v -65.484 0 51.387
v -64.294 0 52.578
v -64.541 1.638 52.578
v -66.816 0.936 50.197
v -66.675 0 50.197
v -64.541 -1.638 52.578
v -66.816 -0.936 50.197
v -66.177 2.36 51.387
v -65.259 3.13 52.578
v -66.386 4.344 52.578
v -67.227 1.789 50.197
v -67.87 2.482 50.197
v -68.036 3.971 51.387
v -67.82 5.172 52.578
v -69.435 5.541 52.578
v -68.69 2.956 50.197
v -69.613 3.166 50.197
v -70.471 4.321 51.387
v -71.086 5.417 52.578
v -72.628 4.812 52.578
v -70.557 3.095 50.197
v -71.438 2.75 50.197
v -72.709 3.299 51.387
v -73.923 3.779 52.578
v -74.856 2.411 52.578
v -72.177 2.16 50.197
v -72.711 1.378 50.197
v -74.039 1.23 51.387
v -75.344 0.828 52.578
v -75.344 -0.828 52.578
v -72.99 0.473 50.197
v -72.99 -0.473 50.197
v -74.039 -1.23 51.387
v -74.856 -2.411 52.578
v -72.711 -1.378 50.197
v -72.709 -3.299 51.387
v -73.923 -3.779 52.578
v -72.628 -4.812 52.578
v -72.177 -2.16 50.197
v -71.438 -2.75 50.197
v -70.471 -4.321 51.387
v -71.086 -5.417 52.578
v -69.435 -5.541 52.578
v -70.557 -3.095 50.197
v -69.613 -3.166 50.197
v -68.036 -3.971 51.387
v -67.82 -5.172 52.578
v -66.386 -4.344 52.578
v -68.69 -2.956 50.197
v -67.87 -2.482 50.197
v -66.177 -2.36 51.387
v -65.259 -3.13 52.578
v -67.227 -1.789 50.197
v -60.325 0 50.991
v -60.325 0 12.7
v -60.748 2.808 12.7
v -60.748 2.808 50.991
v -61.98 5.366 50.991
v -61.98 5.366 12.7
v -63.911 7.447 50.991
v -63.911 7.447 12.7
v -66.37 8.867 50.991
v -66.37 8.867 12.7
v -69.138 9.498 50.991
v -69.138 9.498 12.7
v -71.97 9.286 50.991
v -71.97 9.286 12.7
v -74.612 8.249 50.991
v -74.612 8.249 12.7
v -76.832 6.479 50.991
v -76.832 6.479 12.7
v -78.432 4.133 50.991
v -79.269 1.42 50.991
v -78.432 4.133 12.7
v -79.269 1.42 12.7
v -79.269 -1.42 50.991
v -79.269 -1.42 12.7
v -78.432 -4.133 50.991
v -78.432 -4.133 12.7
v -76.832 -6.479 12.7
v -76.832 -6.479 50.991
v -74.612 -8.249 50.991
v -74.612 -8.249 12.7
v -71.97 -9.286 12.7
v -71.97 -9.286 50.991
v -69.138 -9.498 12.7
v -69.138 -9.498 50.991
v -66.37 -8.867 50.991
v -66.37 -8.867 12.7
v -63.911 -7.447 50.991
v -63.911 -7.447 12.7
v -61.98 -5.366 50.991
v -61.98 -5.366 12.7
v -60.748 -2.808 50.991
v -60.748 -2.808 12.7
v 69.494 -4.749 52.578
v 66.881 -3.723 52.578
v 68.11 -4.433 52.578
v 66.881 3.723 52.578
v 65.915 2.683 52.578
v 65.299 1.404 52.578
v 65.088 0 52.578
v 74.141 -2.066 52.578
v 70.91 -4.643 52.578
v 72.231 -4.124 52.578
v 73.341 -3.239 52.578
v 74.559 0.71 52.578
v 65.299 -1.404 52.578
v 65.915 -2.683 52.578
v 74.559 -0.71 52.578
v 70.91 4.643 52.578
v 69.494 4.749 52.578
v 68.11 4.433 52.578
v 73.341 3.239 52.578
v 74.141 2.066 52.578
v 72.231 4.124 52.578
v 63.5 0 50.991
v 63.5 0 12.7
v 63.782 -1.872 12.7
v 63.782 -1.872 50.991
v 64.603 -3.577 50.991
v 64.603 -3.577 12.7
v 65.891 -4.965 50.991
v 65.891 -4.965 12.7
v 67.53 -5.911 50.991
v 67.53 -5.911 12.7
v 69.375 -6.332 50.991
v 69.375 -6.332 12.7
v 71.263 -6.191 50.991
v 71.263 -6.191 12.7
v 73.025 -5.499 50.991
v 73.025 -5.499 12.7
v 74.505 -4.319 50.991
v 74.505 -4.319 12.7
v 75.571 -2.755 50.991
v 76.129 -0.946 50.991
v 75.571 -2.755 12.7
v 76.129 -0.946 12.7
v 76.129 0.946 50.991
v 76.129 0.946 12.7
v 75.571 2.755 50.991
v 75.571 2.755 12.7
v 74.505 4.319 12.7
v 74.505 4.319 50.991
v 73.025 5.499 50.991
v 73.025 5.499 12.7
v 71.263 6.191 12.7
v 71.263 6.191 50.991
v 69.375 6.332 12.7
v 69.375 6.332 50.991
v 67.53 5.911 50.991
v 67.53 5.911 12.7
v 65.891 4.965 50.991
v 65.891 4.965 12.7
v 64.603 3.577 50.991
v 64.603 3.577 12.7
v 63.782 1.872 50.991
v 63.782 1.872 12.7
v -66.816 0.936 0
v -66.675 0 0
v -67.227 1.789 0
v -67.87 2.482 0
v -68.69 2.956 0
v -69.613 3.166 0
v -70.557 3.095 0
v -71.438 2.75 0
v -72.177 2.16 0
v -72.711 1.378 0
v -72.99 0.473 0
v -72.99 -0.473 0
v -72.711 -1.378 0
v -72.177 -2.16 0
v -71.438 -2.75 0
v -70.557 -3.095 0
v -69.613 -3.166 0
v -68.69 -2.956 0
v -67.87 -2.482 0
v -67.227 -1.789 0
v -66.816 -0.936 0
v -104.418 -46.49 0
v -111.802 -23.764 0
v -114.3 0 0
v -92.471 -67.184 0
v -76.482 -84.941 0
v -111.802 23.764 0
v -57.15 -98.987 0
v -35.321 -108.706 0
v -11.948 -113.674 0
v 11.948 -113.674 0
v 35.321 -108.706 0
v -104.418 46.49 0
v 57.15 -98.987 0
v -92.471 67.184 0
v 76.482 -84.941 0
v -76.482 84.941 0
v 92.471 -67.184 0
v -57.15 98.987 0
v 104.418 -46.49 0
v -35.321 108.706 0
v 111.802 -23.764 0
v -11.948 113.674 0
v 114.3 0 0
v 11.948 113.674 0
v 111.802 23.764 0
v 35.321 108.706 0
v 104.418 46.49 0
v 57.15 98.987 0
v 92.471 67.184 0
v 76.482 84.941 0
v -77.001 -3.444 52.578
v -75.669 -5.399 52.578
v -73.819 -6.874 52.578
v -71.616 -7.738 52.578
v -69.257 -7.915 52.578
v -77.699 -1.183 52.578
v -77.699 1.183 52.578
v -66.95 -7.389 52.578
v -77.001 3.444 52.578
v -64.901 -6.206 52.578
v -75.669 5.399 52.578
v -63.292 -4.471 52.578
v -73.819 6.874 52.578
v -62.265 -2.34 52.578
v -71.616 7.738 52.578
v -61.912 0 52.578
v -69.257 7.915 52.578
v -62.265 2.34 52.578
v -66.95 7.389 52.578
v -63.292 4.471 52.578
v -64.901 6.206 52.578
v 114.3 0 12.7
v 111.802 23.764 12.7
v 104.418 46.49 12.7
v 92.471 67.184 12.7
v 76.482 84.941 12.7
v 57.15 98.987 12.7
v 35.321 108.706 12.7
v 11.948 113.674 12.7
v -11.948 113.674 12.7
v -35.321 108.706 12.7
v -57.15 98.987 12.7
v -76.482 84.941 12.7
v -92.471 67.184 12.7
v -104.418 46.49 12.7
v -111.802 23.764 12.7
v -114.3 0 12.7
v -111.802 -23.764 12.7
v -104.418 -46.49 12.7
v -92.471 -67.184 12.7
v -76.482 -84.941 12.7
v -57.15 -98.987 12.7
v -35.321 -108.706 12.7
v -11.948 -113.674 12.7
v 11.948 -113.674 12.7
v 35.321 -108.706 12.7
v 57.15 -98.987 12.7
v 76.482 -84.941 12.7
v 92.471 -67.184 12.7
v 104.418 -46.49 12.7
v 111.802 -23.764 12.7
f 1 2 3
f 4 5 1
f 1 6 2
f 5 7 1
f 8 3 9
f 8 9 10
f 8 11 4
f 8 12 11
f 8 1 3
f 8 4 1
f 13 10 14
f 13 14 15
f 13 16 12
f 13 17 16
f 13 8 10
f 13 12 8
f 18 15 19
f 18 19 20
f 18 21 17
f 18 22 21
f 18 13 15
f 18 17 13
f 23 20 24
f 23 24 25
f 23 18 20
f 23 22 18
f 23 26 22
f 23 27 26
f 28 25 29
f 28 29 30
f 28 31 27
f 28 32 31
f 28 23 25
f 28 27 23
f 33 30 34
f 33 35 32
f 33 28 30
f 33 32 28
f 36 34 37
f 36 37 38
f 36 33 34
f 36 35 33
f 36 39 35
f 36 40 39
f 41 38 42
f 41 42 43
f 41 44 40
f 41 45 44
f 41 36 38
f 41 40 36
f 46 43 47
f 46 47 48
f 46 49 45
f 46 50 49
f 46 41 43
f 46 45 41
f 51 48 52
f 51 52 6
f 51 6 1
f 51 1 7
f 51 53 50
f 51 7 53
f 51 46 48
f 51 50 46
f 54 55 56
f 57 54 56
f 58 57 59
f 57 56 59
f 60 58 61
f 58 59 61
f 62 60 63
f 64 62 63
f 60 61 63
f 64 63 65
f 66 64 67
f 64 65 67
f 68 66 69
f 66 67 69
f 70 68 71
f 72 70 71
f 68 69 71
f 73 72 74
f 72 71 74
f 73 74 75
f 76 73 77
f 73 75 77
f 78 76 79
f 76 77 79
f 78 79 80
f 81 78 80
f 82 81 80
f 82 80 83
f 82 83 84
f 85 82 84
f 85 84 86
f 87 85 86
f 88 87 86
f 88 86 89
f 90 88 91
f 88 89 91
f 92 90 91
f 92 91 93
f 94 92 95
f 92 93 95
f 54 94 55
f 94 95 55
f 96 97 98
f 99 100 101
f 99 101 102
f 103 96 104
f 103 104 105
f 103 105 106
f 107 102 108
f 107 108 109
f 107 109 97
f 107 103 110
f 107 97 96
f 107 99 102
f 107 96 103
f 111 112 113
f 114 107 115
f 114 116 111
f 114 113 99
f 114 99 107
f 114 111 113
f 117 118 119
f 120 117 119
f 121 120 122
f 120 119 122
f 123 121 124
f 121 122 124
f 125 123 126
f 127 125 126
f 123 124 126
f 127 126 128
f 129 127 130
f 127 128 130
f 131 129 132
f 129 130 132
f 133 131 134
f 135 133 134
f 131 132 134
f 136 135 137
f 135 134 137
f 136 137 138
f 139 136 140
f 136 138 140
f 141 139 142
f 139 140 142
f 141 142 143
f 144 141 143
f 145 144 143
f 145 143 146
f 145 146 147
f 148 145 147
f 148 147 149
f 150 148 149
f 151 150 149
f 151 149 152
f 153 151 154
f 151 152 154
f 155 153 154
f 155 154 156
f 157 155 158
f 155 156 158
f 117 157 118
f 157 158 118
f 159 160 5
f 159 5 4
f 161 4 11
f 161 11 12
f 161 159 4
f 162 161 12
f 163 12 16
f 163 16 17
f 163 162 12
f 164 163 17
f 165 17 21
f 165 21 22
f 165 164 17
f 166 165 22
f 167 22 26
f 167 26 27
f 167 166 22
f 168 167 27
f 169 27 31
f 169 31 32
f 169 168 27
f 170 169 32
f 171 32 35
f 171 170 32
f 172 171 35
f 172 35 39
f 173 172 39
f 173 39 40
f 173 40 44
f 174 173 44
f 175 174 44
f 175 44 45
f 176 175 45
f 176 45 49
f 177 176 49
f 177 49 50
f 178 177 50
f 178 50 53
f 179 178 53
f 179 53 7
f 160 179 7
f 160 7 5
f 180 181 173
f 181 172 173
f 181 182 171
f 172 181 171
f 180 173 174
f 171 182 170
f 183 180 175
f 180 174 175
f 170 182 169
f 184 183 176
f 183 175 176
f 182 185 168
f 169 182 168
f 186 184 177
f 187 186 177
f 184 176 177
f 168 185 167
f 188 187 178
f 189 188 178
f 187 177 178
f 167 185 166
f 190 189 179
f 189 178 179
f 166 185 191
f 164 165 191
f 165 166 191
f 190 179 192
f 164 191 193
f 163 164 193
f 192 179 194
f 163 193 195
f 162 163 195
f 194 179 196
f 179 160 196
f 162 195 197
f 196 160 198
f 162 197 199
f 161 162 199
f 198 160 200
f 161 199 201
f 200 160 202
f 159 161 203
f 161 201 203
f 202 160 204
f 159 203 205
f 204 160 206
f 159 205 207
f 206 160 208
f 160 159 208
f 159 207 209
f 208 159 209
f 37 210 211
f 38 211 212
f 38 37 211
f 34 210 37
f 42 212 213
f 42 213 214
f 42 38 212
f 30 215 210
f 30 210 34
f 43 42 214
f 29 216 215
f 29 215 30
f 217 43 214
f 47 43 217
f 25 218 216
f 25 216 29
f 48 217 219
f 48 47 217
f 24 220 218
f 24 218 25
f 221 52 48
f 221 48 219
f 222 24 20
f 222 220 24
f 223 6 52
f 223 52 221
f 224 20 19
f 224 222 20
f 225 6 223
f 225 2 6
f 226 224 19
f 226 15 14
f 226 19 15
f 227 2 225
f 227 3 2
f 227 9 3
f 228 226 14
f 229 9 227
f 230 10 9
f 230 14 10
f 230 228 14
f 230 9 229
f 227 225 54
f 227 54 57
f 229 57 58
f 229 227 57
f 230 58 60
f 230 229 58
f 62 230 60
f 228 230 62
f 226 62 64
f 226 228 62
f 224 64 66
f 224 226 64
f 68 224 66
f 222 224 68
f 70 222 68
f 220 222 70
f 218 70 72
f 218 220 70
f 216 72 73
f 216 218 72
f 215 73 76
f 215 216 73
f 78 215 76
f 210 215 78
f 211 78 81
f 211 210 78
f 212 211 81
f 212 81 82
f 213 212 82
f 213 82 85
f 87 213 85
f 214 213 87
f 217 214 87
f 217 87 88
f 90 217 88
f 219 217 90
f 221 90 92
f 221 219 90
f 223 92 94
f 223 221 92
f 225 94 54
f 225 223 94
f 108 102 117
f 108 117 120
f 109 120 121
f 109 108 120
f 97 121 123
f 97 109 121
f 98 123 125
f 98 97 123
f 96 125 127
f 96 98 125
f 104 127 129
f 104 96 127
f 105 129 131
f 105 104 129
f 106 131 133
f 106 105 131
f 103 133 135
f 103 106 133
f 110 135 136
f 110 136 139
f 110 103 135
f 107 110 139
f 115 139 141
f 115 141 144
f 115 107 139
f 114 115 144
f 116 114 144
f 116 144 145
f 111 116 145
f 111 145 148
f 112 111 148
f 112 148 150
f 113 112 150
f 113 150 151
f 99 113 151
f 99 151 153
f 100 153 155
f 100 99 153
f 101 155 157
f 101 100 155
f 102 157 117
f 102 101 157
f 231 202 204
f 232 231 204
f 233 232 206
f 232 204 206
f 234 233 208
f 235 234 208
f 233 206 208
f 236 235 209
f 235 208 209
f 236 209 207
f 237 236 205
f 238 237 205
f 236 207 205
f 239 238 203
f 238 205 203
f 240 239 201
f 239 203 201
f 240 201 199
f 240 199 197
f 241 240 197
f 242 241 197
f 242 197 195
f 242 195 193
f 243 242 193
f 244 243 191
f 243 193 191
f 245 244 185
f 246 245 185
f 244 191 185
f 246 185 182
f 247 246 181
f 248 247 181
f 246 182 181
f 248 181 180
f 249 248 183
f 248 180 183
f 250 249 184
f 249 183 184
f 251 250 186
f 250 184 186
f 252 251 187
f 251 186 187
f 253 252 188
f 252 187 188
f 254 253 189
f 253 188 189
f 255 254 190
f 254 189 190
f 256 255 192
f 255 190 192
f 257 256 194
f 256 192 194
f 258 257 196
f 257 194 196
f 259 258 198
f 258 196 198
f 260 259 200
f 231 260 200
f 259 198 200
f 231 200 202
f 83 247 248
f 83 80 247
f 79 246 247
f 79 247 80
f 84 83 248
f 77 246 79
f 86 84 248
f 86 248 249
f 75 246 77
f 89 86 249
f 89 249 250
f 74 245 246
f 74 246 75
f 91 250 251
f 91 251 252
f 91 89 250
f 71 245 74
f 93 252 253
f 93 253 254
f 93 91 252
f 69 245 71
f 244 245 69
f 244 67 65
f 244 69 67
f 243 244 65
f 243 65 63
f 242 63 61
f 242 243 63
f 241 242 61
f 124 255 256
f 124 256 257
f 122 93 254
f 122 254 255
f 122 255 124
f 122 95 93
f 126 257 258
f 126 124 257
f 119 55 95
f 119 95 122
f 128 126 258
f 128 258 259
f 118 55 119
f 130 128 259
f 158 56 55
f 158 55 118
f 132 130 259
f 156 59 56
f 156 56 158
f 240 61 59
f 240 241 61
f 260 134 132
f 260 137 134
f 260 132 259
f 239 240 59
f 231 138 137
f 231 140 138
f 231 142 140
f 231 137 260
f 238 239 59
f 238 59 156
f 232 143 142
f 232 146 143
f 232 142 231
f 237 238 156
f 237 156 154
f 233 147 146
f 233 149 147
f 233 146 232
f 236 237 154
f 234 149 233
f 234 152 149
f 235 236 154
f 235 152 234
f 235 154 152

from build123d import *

# Parameters (mm, degrees)
F0_R     = 114.3
F0_R_2   = 3.175
F1_DEPTH = 12.7
F2_R     = 9.525
F2_R_2   = 3.175
F3_DEPTH = 39.878
F4_SIZE  = 2.38125
F5_SIZE  = 1.5875
F6_SIZE  = 1.5875


with BuildPart() as f1:
    # F0 (on Top) → F1 (new body)
    with BuildSketch(Plane.XY):
        Circle(F0_R)
        with Locations((-69.85, 0)):
            Circle(F0_R_2, mode=Mode.SUBTRACT)
    extrude(amount=F1_DEPTH)

    # F2 (on face) → F3 (join)
    with BuildSketch(Plane.XY.offset(12.7)):
        with BuildLine():
            ThreePointArc((76.2, 0), (69.85, 6.35), (63.5, 0))
            ThreePointArc((63.5, 0), (69.85, -6.35), (76.2, 0))
        make_face()
        with Locations((-69.85, 0)):
            Circle(F2_R)
        with Locations((-69.85, 0)):
            Circle(F2_R_2, mode=Mode.SUBTRACT)
    extrude(amount=F3_DEPTH)

    # F4
    f4_edges = [f1.edges().sort_by_distance(p)[0] for p in [
        (-73.025, 0, 52.578),
    ]]
    chamfer(f4_edges, length=F4_SIZE)

    # F5
    f5_edges = [f1.edges().sort_by_distance(p)[0] for p in [
        (76.2, 0, 52.578),
    ]]
    chamfer(f5_edges, length=F5_SIZE)

    # F6
    f6_edges = [f1.edges().sort_by_distance(p)[0] for p in [
        (-79.375, 0, 52.578),
    ]]
    chamfer(f6_edges, length=F6_SIZE)


solid = f1.part
